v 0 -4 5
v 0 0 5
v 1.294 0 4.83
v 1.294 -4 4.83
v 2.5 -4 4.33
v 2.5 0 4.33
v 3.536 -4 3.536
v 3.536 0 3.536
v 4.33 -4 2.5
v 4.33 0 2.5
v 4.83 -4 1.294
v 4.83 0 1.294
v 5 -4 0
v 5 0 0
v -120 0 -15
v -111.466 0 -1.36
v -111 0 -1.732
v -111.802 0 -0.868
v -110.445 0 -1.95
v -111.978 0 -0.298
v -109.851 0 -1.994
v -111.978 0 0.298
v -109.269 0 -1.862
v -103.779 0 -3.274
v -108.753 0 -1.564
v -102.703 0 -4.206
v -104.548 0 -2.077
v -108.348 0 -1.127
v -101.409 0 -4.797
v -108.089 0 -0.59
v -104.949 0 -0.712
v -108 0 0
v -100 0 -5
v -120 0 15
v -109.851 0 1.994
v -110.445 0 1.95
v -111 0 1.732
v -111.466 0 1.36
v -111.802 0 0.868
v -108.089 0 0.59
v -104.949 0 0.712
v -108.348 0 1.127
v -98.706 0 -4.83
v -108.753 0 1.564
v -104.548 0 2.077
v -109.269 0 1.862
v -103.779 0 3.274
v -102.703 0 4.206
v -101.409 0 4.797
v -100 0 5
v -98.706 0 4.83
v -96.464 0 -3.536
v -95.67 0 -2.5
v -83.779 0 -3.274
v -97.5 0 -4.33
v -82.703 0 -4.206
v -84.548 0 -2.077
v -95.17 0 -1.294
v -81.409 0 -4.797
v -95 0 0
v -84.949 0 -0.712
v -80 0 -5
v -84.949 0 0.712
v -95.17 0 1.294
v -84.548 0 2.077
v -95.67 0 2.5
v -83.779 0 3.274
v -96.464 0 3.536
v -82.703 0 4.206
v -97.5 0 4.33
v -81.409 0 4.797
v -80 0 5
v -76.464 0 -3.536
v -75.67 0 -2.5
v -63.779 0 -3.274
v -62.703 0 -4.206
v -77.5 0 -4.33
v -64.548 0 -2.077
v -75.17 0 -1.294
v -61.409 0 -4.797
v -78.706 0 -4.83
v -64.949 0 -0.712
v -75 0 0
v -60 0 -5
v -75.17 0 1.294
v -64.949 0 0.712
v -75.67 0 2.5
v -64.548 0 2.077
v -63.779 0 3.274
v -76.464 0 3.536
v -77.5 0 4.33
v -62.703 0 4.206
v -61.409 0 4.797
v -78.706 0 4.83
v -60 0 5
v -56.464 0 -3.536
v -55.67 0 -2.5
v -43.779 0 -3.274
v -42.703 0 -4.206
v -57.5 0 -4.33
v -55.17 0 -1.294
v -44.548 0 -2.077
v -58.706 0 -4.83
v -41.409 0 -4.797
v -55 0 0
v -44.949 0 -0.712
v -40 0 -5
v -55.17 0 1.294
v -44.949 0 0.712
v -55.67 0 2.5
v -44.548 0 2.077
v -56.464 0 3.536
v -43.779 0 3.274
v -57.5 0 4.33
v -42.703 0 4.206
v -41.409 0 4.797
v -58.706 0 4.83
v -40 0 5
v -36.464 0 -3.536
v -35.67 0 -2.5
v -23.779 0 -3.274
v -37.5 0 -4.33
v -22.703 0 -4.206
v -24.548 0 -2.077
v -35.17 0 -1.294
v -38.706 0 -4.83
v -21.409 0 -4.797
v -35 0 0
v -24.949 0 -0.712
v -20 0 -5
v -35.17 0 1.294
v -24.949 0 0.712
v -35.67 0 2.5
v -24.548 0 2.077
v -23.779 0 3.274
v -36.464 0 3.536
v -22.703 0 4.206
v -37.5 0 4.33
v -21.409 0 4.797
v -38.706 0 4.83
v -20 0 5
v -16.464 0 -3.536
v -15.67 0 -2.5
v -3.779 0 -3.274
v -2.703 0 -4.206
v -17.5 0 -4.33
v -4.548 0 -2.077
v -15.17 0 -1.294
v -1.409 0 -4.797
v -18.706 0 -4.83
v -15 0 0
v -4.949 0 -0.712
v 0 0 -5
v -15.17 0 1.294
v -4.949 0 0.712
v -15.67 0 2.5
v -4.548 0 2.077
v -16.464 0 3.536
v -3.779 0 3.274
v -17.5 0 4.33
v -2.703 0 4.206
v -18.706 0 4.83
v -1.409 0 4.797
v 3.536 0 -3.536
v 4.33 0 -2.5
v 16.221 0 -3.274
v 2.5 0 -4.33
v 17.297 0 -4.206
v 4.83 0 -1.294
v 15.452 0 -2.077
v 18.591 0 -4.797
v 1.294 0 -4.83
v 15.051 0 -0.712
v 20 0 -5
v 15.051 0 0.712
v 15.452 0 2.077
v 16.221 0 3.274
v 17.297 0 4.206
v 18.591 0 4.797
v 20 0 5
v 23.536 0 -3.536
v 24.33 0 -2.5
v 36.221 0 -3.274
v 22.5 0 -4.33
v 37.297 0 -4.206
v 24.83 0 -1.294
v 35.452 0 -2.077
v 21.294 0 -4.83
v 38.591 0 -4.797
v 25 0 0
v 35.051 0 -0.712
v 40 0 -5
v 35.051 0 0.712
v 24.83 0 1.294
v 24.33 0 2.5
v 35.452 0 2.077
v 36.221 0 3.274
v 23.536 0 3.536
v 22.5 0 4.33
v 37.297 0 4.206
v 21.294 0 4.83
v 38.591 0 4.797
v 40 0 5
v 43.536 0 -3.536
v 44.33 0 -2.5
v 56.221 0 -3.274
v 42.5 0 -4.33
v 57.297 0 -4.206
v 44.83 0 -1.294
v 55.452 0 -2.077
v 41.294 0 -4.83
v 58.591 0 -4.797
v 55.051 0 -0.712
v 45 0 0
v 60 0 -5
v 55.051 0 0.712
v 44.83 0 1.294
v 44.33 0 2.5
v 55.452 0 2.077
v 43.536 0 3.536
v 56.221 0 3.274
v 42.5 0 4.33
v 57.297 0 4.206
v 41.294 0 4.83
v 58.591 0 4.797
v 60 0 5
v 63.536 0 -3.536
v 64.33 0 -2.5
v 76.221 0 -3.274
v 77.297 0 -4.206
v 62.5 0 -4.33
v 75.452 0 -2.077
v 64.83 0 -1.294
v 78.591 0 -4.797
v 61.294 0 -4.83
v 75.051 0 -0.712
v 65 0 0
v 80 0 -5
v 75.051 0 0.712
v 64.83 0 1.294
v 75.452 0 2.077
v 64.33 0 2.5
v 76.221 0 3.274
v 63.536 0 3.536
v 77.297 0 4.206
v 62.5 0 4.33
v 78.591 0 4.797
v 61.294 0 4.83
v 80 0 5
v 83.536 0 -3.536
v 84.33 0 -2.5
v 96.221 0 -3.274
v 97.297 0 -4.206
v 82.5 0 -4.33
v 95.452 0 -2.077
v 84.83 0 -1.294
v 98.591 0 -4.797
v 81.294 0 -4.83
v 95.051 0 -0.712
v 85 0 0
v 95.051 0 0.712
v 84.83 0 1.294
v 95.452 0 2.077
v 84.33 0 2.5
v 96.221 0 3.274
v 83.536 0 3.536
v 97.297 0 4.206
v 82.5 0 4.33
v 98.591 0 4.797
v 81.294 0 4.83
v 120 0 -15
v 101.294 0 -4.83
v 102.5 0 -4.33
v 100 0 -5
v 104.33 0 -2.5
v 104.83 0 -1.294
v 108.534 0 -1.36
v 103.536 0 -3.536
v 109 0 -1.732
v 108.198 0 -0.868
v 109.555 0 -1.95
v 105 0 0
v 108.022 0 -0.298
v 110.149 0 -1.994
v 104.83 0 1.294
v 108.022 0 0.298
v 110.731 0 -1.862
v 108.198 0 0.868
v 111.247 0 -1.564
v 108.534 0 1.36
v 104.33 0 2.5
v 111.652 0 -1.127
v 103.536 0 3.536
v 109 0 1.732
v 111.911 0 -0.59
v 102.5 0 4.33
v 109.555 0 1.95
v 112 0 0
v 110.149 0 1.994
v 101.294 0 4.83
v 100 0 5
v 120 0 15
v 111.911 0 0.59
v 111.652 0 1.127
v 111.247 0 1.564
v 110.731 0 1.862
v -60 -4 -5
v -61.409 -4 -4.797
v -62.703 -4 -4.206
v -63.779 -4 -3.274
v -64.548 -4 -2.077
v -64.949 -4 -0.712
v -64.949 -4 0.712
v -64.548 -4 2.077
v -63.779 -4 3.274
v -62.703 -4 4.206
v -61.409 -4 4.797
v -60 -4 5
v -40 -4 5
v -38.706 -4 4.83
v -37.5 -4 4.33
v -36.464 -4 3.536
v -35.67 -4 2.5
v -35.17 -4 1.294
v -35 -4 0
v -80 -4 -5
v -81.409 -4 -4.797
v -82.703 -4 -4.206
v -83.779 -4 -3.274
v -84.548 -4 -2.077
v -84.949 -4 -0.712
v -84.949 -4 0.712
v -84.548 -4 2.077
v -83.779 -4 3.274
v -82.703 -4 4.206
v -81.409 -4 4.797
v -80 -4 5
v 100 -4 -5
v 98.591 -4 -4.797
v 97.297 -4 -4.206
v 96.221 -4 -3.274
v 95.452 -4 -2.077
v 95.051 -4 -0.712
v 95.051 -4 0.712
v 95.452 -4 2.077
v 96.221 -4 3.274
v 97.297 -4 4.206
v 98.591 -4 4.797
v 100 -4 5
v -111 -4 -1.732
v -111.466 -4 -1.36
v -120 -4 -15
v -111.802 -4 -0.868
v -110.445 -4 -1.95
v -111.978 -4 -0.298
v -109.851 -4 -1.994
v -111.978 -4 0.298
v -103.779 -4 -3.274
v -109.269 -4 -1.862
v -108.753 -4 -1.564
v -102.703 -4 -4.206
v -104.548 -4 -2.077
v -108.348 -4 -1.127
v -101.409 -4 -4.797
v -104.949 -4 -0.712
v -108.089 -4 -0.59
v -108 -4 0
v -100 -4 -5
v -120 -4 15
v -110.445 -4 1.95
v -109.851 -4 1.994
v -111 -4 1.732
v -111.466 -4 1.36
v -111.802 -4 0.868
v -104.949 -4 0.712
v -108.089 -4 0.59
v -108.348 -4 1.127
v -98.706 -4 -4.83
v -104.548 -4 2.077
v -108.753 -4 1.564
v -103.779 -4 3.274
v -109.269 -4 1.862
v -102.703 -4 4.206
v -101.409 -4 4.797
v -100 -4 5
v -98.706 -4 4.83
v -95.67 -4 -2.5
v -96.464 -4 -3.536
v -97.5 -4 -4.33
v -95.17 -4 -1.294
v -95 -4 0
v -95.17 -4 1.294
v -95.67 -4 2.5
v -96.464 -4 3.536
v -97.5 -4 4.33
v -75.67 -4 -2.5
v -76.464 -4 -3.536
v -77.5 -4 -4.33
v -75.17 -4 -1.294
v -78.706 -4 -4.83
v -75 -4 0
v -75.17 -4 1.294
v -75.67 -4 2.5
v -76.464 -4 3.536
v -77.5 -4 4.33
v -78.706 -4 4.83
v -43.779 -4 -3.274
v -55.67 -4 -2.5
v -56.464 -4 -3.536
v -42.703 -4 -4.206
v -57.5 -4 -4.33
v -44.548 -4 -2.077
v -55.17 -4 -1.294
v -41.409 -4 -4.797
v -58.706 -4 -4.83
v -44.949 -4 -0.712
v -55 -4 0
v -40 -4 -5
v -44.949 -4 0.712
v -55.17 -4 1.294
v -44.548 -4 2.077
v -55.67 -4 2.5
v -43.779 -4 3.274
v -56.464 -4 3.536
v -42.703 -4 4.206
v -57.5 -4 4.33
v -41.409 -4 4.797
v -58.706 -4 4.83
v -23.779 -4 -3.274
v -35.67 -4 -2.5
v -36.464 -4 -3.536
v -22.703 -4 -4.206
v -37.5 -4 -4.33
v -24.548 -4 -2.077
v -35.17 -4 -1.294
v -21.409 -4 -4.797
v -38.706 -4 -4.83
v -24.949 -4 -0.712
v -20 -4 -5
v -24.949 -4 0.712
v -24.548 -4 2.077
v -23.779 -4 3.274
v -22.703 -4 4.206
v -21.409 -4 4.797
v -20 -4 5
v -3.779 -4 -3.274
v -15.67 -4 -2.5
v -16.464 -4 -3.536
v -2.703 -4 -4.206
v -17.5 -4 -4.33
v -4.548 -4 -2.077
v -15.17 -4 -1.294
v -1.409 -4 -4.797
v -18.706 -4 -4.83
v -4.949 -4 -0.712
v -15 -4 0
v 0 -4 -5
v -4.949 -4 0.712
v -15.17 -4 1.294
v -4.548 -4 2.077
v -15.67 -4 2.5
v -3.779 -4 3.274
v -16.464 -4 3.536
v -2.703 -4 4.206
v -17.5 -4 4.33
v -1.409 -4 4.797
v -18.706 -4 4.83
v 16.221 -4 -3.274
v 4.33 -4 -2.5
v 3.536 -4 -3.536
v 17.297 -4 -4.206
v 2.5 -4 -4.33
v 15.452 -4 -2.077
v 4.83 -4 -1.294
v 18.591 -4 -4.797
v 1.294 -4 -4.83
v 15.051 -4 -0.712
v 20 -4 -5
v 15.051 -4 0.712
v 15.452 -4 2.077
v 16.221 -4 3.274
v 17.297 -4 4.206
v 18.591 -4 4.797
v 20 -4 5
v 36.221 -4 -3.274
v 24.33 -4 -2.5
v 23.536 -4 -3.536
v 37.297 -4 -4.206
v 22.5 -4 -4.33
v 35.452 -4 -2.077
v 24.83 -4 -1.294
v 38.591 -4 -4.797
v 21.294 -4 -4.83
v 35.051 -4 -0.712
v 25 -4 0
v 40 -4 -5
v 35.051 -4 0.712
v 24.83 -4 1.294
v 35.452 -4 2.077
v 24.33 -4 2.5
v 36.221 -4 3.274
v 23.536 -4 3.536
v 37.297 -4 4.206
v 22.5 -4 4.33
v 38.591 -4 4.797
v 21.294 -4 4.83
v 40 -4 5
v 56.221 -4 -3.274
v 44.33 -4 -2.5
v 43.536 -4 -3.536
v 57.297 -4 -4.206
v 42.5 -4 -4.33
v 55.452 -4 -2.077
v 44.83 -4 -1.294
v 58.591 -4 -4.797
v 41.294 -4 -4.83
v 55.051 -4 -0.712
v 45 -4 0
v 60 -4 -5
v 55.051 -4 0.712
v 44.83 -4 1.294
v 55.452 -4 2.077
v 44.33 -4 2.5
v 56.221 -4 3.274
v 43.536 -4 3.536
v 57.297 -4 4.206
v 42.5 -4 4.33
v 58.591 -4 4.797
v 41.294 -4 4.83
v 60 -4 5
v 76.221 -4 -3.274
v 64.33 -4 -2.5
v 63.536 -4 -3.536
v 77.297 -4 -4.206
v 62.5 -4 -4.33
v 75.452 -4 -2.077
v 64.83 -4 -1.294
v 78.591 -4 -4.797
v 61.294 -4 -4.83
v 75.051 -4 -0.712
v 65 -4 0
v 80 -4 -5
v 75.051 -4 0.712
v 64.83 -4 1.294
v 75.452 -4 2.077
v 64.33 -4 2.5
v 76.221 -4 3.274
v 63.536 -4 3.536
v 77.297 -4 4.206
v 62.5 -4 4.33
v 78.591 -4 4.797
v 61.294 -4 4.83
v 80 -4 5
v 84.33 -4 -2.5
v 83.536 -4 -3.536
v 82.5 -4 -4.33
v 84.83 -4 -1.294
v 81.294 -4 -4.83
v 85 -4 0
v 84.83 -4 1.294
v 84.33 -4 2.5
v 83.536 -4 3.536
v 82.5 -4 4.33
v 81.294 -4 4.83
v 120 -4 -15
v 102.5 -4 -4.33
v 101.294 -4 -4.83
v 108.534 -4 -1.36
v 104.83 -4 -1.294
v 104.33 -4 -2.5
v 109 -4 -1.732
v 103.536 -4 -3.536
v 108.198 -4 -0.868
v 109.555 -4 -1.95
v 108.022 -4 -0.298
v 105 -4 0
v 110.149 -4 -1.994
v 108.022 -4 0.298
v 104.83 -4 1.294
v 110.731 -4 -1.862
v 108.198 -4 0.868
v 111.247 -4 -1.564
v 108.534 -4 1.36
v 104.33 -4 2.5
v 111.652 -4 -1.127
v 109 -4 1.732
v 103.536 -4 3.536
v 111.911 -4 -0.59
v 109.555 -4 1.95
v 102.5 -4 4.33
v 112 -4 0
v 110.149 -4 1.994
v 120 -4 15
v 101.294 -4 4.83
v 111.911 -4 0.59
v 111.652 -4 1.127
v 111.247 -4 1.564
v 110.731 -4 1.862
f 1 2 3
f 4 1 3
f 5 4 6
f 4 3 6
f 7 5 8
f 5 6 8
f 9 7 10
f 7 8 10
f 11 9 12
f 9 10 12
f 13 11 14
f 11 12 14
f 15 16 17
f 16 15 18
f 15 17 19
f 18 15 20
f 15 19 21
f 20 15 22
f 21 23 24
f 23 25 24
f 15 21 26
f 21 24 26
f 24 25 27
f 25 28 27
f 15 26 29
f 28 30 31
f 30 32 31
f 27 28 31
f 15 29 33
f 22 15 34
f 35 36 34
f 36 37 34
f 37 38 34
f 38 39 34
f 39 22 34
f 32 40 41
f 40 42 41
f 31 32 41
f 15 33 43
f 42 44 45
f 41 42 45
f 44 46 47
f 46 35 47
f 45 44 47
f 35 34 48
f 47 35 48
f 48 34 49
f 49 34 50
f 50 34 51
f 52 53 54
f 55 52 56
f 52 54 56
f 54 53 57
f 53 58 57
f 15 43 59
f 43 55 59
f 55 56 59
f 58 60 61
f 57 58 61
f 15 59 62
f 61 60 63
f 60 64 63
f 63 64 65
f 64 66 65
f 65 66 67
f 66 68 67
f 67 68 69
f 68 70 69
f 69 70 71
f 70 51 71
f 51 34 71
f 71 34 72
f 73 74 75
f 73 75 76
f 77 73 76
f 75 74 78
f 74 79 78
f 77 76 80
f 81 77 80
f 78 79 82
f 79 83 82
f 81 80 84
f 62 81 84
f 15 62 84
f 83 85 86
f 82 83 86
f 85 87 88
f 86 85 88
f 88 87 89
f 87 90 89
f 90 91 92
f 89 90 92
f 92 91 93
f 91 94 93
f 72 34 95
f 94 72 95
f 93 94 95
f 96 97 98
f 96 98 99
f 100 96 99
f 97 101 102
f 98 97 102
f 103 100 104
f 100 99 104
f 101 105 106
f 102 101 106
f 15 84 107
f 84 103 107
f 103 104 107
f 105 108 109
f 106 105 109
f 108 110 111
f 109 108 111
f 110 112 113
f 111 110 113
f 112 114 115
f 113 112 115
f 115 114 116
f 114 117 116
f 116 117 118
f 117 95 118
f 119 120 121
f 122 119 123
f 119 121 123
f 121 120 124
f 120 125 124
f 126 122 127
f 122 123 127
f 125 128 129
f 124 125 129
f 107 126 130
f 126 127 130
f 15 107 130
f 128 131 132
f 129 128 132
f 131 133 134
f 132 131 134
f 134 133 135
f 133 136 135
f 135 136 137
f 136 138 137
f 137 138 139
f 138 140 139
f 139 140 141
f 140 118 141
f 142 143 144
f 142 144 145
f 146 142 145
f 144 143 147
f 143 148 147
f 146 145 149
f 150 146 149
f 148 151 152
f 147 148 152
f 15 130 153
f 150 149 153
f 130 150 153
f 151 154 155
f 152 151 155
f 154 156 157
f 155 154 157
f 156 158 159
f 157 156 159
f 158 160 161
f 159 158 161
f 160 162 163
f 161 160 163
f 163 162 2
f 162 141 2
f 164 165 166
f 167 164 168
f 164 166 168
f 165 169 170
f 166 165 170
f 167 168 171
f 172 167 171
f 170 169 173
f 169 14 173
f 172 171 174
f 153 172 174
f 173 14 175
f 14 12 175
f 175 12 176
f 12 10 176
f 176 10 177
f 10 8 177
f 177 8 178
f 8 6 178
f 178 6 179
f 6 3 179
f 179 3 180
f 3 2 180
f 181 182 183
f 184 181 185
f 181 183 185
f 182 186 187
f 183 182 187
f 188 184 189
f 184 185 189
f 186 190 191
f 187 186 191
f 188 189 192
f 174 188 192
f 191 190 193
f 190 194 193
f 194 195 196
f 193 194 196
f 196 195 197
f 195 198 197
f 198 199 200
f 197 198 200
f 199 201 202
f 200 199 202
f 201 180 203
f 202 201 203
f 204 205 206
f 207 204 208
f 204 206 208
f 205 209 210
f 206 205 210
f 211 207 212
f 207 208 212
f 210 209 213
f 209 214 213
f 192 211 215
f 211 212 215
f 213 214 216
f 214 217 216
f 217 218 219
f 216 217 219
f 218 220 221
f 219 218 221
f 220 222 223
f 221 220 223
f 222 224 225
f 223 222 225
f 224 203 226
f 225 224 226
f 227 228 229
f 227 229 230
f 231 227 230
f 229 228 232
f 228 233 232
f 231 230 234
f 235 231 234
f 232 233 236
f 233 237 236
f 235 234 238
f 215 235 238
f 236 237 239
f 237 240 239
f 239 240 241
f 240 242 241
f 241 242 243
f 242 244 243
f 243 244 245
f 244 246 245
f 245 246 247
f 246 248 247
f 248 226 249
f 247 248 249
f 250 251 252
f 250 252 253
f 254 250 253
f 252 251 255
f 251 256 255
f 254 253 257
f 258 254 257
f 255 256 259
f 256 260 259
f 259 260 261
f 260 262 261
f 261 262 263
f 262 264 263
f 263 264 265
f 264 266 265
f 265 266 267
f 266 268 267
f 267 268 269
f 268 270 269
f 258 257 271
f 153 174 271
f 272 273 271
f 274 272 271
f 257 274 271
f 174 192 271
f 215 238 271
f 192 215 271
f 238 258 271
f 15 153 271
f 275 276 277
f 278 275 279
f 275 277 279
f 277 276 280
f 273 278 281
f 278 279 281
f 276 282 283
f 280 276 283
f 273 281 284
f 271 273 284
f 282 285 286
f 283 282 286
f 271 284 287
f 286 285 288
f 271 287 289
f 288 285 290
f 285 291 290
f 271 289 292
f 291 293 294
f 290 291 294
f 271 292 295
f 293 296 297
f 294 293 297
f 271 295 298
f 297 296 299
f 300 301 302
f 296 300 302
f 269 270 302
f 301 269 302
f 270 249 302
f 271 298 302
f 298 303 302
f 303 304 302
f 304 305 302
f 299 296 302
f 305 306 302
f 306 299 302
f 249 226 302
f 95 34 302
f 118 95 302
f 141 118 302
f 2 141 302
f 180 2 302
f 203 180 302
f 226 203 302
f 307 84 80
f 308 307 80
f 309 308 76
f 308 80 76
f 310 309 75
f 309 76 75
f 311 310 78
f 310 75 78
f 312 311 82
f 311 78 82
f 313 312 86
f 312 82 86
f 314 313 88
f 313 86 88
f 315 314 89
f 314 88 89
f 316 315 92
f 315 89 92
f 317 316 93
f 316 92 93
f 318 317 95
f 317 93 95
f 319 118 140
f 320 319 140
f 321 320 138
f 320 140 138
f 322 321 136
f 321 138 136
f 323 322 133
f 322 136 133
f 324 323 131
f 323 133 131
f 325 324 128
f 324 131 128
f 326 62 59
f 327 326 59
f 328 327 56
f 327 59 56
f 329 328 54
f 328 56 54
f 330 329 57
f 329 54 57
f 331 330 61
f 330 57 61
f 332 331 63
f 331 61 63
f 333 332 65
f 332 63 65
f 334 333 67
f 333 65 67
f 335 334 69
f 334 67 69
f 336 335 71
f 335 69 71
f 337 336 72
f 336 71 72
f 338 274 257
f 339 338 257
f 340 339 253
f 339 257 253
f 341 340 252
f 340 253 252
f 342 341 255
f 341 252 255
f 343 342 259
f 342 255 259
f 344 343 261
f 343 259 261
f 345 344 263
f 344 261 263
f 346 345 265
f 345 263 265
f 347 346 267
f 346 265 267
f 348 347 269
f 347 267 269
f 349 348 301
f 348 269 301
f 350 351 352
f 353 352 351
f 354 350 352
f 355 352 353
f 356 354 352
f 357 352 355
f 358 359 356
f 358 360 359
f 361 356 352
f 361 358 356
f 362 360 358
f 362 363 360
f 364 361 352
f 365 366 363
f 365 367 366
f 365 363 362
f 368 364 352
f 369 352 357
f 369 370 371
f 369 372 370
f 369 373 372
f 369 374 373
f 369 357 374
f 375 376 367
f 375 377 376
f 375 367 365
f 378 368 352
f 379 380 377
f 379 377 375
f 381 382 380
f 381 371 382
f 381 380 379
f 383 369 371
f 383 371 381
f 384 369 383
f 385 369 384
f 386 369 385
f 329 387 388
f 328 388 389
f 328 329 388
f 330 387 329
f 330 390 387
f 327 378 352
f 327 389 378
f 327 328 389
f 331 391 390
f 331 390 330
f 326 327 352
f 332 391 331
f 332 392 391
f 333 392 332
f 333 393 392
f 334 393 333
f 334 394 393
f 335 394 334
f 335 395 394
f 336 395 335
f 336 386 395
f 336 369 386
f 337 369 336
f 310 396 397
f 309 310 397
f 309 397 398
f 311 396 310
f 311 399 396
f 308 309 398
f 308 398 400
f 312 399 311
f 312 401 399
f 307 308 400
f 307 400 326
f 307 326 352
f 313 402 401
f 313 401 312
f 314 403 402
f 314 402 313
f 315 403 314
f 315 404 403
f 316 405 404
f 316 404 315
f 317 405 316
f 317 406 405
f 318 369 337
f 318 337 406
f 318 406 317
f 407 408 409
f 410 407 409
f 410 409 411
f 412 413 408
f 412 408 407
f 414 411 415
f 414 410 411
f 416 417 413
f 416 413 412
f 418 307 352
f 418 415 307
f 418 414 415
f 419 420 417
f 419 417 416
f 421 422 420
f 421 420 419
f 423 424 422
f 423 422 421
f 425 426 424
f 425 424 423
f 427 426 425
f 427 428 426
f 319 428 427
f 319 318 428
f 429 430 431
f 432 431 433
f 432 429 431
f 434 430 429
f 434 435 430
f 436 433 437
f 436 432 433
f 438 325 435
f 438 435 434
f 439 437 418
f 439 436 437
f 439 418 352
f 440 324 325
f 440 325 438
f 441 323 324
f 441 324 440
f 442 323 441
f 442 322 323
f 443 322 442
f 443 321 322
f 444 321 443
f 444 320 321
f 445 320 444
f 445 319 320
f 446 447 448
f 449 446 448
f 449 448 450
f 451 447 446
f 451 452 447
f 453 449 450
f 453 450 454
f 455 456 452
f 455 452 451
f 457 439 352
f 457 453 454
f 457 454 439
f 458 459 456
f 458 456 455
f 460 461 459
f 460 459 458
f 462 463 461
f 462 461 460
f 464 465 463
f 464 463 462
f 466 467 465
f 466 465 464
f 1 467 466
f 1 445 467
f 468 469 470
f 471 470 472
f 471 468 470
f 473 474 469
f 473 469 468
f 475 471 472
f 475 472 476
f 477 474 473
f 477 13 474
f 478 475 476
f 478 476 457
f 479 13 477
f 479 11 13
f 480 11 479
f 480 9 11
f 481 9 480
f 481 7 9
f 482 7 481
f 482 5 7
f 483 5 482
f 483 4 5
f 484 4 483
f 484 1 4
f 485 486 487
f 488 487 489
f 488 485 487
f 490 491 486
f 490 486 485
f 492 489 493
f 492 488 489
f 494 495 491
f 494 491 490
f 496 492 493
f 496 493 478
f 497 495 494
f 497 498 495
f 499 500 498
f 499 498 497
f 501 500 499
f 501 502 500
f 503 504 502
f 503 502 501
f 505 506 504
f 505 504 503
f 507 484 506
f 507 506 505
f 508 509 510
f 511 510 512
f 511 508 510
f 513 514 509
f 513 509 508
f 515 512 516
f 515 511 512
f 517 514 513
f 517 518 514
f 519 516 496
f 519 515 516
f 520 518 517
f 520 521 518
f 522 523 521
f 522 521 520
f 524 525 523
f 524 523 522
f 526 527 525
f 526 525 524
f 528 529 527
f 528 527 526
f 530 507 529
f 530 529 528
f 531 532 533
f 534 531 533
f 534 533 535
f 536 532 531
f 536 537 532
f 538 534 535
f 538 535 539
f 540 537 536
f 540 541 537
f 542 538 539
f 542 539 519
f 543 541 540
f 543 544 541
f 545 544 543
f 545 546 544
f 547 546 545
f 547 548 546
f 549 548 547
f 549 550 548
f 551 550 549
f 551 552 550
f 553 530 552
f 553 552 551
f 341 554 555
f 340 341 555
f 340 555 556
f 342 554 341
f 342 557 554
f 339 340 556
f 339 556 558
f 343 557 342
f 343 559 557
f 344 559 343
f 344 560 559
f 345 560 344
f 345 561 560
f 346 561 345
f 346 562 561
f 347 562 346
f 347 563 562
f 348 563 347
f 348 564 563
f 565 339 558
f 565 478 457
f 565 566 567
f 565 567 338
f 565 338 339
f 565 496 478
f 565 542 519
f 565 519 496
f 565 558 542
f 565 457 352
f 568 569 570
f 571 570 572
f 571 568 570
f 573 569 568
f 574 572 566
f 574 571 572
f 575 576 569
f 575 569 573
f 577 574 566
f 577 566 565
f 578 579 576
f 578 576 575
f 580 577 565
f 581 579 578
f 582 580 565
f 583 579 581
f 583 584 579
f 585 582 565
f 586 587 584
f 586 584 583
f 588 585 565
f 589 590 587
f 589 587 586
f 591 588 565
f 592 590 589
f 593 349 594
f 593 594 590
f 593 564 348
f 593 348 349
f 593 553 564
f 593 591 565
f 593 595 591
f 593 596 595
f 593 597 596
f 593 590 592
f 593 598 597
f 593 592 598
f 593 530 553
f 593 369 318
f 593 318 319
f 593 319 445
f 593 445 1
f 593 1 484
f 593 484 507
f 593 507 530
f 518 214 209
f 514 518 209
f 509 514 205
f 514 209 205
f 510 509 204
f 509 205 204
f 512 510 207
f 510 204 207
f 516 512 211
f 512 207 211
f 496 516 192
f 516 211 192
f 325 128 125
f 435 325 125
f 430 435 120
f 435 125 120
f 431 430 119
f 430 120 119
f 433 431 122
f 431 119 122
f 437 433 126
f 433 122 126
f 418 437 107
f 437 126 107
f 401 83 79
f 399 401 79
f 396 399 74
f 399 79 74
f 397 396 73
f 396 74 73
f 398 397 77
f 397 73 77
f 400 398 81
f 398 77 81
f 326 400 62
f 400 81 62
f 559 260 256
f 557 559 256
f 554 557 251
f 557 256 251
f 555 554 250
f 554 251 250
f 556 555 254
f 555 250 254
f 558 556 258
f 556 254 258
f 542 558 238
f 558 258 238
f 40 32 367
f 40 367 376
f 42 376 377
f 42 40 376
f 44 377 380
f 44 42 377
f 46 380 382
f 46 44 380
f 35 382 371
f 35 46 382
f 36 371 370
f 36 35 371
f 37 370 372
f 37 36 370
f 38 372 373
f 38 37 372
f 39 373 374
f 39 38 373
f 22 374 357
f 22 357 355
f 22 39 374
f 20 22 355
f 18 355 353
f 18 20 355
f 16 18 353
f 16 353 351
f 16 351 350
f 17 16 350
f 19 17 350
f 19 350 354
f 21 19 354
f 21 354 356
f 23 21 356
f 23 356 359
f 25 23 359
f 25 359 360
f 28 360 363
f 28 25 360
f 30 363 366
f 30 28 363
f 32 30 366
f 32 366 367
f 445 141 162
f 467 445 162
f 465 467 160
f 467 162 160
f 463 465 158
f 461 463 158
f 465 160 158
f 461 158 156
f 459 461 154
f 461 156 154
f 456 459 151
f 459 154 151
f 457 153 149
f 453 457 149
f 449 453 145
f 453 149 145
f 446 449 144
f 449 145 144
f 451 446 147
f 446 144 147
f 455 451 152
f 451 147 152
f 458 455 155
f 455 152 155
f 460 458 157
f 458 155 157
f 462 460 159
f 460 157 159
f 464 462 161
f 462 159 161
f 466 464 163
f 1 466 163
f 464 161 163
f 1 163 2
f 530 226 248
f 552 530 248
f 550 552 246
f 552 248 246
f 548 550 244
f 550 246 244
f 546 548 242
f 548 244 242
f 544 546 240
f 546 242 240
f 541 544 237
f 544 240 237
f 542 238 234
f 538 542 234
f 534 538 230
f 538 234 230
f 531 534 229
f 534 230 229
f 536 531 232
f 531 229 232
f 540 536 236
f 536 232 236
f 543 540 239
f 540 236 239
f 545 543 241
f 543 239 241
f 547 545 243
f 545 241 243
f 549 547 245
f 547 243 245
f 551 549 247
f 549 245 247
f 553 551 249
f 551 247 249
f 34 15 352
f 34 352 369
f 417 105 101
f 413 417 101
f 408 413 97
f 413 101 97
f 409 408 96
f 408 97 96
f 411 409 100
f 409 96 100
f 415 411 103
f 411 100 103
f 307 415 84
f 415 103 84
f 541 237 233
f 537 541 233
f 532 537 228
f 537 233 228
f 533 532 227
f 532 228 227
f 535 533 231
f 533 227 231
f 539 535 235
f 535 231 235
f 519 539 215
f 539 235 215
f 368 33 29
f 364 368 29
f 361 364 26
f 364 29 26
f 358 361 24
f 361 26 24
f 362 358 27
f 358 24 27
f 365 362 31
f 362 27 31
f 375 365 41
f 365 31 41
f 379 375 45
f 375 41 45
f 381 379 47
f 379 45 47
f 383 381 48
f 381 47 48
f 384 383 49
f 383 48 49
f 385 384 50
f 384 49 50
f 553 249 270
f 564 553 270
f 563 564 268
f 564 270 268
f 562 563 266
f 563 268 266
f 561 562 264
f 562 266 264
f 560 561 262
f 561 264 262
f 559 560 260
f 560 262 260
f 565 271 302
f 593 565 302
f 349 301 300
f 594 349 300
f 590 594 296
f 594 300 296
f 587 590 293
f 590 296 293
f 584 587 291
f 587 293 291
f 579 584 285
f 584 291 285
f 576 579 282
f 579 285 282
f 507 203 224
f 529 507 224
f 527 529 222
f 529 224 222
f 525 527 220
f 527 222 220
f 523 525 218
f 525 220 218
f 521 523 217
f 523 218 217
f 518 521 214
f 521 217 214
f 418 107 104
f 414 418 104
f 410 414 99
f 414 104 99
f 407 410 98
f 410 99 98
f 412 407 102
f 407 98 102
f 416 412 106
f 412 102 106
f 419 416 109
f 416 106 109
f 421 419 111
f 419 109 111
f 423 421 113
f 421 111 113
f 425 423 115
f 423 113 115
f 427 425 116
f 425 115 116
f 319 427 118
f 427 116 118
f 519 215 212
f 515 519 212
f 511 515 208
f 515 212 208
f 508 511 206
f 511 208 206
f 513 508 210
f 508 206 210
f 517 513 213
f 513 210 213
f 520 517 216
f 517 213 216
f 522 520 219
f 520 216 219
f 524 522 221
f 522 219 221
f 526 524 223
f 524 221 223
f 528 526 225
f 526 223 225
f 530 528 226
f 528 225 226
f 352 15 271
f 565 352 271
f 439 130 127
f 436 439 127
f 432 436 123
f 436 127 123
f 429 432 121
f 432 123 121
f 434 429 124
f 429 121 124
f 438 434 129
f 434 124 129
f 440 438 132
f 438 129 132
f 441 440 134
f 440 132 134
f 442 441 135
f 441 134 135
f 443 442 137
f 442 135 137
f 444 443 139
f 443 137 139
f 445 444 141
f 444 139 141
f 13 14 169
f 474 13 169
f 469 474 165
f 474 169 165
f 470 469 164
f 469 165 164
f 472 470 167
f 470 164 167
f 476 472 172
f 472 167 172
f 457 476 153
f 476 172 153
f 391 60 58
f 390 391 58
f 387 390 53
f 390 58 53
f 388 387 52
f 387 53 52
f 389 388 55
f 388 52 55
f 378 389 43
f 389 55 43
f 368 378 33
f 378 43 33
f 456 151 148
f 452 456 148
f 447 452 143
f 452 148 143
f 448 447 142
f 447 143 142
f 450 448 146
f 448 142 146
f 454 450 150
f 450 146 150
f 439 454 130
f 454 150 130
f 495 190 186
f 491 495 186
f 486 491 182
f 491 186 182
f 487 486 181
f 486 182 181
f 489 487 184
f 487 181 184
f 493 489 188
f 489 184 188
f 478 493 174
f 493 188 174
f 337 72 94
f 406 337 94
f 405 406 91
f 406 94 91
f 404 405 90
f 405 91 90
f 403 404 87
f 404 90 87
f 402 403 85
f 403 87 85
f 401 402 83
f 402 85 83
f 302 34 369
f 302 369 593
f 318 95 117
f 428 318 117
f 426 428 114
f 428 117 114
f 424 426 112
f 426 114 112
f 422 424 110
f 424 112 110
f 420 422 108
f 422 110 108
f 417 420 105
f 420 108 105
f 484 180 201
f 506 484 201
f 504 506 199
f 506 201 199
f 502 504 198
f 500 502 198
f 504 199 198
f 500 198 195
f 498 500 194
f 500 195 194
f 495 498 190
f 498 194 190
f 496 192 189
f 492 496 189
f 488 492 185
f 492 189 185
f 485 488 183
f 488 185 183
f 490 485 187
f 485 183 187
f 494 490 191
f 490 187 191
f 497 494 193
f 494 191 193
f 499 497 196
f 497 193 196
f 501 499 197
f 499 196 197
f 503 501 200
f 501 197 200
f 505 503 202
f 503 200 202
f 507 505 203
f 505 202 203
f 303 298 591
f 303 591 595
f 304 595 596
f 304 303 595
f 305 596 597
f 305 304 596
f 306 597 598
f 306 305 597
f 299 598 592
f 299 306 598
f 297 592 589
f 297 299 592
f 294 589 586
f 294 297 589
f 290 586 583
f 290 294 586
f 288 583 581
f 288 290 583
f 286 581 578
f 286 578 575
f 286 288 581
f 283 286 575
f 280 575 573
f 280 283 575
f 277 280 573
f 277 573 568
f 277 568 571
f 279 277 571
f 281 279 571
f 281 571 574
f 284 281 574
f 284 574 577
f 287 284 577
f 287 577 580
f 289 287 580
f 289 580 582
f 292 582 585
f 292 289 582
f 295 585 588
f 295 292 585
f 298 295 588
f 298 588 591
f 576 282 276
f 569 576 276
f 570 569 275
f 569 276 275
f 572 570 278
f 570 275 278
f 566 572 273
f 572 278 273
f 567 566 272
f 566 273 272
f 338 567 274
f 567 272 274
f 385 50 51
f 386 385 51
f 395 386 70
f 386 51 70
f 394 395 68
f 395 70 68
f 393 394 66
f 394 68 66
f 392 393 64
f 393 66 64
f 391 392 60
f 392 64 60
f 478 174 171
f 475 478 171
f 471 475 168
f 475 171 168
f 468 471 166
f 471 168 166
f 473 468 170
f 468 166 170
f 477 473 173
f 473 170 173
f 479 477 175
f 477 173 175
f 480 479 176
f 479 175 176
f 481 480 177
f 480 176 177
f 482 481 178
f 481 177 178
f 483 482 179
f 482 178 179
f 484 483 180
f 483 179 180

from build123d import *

# Parameters (mm, degrees)
F0_W     = 240
F0_H     = 30
F0_R     = 2
F1_DEPTH = 4


with BuildPart() as f1:
    # F0 (on Front) → F1 (new body)
    with BuildSketch(Plane.XZ):
        Rectangle(F0_W, F0_H)
        with Locations((-110, 0)):
            Circle(F0_R, mode=Mode.SUBTRACT)
        with BuildLine():
            ThreePointArc((105, 0), (103.5355339059, -3.5355339059), (100, -5))
            Line((100, -5), (80, -5))
            Line((80, -5), (60, -5))
            Line((60, -5), (40, -5))
            Line((40, -5), (20.0000000117, -5))
            Line((20.0000000117, -5), (-1.87e-08, -5))
            Line((-1.87e-08, -5), (-19.9999999883, -5))
            Line((-19.9999999883, -5), (-40, -5))
            Line((-40, -5), (-60, -5))
            Line((-60, -5), (-80, -5))
            Line((-80, -5), (-100, -5))
            ThreePointArc((-100, -5), (-105, 0), (-100, 5))
            Line((-100, 5), (-80, 5))
            Line((-80, 5), (-60, 5))
            Line((-60, 5), (-40, 5))
            Line((-40, 5), (-20, 5))
            Line((-20, 5), (-1.17e-08, 5))
            Line((-1.17e-08, 5), (20, 5))
            Line((20, 5), (40, 5))
            Line((40, 5), (60, 5))
            Line((60, 5), (80, 5))
            Line((80, 5), (100, 5))
            ThreePointArc((100, 5), (103.5355339059, 3.5355339059), (105, 0))
        make_face(mode=Mode.SUBTRACT)
        with Locations((110, 0)):
            Circle(F0_R, mode=Mode.SUBTRACT)
        with BuildLine():
            Line((-100, -5), (-80, -5))
            ThreePointArc((-80, -5), (-85, 0), (-80, 5))
            Line((-80, 5), (-100, 5))
            ThreePointArc((-100, 5), (-96.4644660941, 3.5355339059), (-95, 0))
            ThreePointArc((-95, 0), (-96.4644660941, -3.5355339059), (-100, -5))
        make_face()
        with BuildLine():
            Line((-80, -5), (-60, -5))
            ThreePointArc((-60, -5), (-65, 0), (-60, 5))
            Line((-60, 5), (-80, 5))
            ThreePointArc((-80, 5), (-76.4644660941, 3.5355339059), (-75, 0))
            ThreePointArc((-75, 0), (-76.4644660941, -3.5355339059), (-80, -5))
        make_face()
        with BuildLine():
            Line((-60, -5), (-40, -5))
            ThreePointArc((-40, -5), (-45, 0), (-40, 5))
            Line((-40, 5), (-60, 5))
            ThreePointArc((-60, 5), (-56.4644660941, 3.5355339059), (-55, 0))
            ThreePointArc((-55, 0), (-56.4644660941, -3.5355339059), (-60, -5))
        make_face()
        with BuildLine():
            Line((-40, -5), (-19.9999999883, -5))
            ThreePointArc((-19.9999999883, -5), (-25, -5.8e-09), (-20, 5))
            Line((-20, 5), (-40, 5))
            ThreePointArc((-40, 5), (-36.4644660941, 3.5355339059), (-35, 0))
            ThreePointArc((-35, 0), (-36.4644660941, -3.5355339059), (-40, -5))
        make_face()
        with BuildLine():
            Line((-19.9999999883, -5), (-1.87e-08, -5))
            ThreePointArc((-1.87e-08, -5), (-5, 3.5e-09), (-1.17e-08, 5))
            Line((-1.17e-08, 5), (-20, 5))
            ThreePointArc((-20, 5), (-16.4644660941, 3.5355339059), (-15, 0))
            ThreePointArc((-15, 0), (-16.4644660899, -3.5355339018), (-19.9999999883, -5))
        make_face()
        with BuildLine():
            Line((-1.87e-08, -5), (20.0000000117, -5))
            ThreePointArc((20.0000000117, -5), (15, -5.8e-09), (20, 5))
            Line((20, 5), (-1.17e-08, 5))
            ThreePointArc((-1.17e-08, 5), (3.5355339018, 3.5355339101), (5, 0))
            ThreePointArc((5, 0), (3.5355338993, -3.5355339125), (-1.87e-08, -5))
        make_face()
        with BuildLine():
            Line((20.0000000117, -5), (40, -5))
            ThreePointArc((40, -5), (35, 0), (40, 5))
            Line((40, 5), (20, 5))
            ThreePointArc((20, 5), (23.5355339059, 3.5355339059), (25, 0))
            ThreePointArc((25, 0), (23.5355339101, -3.5355339018), (20.0000000117, -5))
        make_face()
        with BuildLine():
            Line((40, -5), (60, -5))
            ThreePointArc((60, -5), (55, 0), (60, 5))
            Line((60, 5), (40, 5))
            ThreePointArc((40, 5), (43.5355339059, 3.5355339059), (45, 0))
            ThreePointArc((45, 0), (43.5355339059, -3.5355339059), (40, -5))
        make_face()
        with BuildLine():
            Line((60, -5), (80, -5))
            ThreePointArc((80, -5), (75, 0), (80, 5))
            Line((80, 5), (60, 5))
            ThreePointArc((60, 5), (63.5355339059, 3.5355339059), (65, 0))
            ThreePointArc((65, 0), (63.5355339059, -3.5355339059), (60, -5))
        make_face()
        with BuildLine():
            Line((80, -5), (100, -5))
            ThreePointArc((100, -5), (95, 0), (100, 5))
            Line((100, 5), (80, 5))
            ThreePointArc((80, 5), (83.5355339059, 3.5355339059), (85, 0))
            ThreePointArc((85, 0), (83.5355339059, -3.5355339059), (80, -5))
        make_face()
    extrude(amount=F1_DEPTH)


solid = f1.part
